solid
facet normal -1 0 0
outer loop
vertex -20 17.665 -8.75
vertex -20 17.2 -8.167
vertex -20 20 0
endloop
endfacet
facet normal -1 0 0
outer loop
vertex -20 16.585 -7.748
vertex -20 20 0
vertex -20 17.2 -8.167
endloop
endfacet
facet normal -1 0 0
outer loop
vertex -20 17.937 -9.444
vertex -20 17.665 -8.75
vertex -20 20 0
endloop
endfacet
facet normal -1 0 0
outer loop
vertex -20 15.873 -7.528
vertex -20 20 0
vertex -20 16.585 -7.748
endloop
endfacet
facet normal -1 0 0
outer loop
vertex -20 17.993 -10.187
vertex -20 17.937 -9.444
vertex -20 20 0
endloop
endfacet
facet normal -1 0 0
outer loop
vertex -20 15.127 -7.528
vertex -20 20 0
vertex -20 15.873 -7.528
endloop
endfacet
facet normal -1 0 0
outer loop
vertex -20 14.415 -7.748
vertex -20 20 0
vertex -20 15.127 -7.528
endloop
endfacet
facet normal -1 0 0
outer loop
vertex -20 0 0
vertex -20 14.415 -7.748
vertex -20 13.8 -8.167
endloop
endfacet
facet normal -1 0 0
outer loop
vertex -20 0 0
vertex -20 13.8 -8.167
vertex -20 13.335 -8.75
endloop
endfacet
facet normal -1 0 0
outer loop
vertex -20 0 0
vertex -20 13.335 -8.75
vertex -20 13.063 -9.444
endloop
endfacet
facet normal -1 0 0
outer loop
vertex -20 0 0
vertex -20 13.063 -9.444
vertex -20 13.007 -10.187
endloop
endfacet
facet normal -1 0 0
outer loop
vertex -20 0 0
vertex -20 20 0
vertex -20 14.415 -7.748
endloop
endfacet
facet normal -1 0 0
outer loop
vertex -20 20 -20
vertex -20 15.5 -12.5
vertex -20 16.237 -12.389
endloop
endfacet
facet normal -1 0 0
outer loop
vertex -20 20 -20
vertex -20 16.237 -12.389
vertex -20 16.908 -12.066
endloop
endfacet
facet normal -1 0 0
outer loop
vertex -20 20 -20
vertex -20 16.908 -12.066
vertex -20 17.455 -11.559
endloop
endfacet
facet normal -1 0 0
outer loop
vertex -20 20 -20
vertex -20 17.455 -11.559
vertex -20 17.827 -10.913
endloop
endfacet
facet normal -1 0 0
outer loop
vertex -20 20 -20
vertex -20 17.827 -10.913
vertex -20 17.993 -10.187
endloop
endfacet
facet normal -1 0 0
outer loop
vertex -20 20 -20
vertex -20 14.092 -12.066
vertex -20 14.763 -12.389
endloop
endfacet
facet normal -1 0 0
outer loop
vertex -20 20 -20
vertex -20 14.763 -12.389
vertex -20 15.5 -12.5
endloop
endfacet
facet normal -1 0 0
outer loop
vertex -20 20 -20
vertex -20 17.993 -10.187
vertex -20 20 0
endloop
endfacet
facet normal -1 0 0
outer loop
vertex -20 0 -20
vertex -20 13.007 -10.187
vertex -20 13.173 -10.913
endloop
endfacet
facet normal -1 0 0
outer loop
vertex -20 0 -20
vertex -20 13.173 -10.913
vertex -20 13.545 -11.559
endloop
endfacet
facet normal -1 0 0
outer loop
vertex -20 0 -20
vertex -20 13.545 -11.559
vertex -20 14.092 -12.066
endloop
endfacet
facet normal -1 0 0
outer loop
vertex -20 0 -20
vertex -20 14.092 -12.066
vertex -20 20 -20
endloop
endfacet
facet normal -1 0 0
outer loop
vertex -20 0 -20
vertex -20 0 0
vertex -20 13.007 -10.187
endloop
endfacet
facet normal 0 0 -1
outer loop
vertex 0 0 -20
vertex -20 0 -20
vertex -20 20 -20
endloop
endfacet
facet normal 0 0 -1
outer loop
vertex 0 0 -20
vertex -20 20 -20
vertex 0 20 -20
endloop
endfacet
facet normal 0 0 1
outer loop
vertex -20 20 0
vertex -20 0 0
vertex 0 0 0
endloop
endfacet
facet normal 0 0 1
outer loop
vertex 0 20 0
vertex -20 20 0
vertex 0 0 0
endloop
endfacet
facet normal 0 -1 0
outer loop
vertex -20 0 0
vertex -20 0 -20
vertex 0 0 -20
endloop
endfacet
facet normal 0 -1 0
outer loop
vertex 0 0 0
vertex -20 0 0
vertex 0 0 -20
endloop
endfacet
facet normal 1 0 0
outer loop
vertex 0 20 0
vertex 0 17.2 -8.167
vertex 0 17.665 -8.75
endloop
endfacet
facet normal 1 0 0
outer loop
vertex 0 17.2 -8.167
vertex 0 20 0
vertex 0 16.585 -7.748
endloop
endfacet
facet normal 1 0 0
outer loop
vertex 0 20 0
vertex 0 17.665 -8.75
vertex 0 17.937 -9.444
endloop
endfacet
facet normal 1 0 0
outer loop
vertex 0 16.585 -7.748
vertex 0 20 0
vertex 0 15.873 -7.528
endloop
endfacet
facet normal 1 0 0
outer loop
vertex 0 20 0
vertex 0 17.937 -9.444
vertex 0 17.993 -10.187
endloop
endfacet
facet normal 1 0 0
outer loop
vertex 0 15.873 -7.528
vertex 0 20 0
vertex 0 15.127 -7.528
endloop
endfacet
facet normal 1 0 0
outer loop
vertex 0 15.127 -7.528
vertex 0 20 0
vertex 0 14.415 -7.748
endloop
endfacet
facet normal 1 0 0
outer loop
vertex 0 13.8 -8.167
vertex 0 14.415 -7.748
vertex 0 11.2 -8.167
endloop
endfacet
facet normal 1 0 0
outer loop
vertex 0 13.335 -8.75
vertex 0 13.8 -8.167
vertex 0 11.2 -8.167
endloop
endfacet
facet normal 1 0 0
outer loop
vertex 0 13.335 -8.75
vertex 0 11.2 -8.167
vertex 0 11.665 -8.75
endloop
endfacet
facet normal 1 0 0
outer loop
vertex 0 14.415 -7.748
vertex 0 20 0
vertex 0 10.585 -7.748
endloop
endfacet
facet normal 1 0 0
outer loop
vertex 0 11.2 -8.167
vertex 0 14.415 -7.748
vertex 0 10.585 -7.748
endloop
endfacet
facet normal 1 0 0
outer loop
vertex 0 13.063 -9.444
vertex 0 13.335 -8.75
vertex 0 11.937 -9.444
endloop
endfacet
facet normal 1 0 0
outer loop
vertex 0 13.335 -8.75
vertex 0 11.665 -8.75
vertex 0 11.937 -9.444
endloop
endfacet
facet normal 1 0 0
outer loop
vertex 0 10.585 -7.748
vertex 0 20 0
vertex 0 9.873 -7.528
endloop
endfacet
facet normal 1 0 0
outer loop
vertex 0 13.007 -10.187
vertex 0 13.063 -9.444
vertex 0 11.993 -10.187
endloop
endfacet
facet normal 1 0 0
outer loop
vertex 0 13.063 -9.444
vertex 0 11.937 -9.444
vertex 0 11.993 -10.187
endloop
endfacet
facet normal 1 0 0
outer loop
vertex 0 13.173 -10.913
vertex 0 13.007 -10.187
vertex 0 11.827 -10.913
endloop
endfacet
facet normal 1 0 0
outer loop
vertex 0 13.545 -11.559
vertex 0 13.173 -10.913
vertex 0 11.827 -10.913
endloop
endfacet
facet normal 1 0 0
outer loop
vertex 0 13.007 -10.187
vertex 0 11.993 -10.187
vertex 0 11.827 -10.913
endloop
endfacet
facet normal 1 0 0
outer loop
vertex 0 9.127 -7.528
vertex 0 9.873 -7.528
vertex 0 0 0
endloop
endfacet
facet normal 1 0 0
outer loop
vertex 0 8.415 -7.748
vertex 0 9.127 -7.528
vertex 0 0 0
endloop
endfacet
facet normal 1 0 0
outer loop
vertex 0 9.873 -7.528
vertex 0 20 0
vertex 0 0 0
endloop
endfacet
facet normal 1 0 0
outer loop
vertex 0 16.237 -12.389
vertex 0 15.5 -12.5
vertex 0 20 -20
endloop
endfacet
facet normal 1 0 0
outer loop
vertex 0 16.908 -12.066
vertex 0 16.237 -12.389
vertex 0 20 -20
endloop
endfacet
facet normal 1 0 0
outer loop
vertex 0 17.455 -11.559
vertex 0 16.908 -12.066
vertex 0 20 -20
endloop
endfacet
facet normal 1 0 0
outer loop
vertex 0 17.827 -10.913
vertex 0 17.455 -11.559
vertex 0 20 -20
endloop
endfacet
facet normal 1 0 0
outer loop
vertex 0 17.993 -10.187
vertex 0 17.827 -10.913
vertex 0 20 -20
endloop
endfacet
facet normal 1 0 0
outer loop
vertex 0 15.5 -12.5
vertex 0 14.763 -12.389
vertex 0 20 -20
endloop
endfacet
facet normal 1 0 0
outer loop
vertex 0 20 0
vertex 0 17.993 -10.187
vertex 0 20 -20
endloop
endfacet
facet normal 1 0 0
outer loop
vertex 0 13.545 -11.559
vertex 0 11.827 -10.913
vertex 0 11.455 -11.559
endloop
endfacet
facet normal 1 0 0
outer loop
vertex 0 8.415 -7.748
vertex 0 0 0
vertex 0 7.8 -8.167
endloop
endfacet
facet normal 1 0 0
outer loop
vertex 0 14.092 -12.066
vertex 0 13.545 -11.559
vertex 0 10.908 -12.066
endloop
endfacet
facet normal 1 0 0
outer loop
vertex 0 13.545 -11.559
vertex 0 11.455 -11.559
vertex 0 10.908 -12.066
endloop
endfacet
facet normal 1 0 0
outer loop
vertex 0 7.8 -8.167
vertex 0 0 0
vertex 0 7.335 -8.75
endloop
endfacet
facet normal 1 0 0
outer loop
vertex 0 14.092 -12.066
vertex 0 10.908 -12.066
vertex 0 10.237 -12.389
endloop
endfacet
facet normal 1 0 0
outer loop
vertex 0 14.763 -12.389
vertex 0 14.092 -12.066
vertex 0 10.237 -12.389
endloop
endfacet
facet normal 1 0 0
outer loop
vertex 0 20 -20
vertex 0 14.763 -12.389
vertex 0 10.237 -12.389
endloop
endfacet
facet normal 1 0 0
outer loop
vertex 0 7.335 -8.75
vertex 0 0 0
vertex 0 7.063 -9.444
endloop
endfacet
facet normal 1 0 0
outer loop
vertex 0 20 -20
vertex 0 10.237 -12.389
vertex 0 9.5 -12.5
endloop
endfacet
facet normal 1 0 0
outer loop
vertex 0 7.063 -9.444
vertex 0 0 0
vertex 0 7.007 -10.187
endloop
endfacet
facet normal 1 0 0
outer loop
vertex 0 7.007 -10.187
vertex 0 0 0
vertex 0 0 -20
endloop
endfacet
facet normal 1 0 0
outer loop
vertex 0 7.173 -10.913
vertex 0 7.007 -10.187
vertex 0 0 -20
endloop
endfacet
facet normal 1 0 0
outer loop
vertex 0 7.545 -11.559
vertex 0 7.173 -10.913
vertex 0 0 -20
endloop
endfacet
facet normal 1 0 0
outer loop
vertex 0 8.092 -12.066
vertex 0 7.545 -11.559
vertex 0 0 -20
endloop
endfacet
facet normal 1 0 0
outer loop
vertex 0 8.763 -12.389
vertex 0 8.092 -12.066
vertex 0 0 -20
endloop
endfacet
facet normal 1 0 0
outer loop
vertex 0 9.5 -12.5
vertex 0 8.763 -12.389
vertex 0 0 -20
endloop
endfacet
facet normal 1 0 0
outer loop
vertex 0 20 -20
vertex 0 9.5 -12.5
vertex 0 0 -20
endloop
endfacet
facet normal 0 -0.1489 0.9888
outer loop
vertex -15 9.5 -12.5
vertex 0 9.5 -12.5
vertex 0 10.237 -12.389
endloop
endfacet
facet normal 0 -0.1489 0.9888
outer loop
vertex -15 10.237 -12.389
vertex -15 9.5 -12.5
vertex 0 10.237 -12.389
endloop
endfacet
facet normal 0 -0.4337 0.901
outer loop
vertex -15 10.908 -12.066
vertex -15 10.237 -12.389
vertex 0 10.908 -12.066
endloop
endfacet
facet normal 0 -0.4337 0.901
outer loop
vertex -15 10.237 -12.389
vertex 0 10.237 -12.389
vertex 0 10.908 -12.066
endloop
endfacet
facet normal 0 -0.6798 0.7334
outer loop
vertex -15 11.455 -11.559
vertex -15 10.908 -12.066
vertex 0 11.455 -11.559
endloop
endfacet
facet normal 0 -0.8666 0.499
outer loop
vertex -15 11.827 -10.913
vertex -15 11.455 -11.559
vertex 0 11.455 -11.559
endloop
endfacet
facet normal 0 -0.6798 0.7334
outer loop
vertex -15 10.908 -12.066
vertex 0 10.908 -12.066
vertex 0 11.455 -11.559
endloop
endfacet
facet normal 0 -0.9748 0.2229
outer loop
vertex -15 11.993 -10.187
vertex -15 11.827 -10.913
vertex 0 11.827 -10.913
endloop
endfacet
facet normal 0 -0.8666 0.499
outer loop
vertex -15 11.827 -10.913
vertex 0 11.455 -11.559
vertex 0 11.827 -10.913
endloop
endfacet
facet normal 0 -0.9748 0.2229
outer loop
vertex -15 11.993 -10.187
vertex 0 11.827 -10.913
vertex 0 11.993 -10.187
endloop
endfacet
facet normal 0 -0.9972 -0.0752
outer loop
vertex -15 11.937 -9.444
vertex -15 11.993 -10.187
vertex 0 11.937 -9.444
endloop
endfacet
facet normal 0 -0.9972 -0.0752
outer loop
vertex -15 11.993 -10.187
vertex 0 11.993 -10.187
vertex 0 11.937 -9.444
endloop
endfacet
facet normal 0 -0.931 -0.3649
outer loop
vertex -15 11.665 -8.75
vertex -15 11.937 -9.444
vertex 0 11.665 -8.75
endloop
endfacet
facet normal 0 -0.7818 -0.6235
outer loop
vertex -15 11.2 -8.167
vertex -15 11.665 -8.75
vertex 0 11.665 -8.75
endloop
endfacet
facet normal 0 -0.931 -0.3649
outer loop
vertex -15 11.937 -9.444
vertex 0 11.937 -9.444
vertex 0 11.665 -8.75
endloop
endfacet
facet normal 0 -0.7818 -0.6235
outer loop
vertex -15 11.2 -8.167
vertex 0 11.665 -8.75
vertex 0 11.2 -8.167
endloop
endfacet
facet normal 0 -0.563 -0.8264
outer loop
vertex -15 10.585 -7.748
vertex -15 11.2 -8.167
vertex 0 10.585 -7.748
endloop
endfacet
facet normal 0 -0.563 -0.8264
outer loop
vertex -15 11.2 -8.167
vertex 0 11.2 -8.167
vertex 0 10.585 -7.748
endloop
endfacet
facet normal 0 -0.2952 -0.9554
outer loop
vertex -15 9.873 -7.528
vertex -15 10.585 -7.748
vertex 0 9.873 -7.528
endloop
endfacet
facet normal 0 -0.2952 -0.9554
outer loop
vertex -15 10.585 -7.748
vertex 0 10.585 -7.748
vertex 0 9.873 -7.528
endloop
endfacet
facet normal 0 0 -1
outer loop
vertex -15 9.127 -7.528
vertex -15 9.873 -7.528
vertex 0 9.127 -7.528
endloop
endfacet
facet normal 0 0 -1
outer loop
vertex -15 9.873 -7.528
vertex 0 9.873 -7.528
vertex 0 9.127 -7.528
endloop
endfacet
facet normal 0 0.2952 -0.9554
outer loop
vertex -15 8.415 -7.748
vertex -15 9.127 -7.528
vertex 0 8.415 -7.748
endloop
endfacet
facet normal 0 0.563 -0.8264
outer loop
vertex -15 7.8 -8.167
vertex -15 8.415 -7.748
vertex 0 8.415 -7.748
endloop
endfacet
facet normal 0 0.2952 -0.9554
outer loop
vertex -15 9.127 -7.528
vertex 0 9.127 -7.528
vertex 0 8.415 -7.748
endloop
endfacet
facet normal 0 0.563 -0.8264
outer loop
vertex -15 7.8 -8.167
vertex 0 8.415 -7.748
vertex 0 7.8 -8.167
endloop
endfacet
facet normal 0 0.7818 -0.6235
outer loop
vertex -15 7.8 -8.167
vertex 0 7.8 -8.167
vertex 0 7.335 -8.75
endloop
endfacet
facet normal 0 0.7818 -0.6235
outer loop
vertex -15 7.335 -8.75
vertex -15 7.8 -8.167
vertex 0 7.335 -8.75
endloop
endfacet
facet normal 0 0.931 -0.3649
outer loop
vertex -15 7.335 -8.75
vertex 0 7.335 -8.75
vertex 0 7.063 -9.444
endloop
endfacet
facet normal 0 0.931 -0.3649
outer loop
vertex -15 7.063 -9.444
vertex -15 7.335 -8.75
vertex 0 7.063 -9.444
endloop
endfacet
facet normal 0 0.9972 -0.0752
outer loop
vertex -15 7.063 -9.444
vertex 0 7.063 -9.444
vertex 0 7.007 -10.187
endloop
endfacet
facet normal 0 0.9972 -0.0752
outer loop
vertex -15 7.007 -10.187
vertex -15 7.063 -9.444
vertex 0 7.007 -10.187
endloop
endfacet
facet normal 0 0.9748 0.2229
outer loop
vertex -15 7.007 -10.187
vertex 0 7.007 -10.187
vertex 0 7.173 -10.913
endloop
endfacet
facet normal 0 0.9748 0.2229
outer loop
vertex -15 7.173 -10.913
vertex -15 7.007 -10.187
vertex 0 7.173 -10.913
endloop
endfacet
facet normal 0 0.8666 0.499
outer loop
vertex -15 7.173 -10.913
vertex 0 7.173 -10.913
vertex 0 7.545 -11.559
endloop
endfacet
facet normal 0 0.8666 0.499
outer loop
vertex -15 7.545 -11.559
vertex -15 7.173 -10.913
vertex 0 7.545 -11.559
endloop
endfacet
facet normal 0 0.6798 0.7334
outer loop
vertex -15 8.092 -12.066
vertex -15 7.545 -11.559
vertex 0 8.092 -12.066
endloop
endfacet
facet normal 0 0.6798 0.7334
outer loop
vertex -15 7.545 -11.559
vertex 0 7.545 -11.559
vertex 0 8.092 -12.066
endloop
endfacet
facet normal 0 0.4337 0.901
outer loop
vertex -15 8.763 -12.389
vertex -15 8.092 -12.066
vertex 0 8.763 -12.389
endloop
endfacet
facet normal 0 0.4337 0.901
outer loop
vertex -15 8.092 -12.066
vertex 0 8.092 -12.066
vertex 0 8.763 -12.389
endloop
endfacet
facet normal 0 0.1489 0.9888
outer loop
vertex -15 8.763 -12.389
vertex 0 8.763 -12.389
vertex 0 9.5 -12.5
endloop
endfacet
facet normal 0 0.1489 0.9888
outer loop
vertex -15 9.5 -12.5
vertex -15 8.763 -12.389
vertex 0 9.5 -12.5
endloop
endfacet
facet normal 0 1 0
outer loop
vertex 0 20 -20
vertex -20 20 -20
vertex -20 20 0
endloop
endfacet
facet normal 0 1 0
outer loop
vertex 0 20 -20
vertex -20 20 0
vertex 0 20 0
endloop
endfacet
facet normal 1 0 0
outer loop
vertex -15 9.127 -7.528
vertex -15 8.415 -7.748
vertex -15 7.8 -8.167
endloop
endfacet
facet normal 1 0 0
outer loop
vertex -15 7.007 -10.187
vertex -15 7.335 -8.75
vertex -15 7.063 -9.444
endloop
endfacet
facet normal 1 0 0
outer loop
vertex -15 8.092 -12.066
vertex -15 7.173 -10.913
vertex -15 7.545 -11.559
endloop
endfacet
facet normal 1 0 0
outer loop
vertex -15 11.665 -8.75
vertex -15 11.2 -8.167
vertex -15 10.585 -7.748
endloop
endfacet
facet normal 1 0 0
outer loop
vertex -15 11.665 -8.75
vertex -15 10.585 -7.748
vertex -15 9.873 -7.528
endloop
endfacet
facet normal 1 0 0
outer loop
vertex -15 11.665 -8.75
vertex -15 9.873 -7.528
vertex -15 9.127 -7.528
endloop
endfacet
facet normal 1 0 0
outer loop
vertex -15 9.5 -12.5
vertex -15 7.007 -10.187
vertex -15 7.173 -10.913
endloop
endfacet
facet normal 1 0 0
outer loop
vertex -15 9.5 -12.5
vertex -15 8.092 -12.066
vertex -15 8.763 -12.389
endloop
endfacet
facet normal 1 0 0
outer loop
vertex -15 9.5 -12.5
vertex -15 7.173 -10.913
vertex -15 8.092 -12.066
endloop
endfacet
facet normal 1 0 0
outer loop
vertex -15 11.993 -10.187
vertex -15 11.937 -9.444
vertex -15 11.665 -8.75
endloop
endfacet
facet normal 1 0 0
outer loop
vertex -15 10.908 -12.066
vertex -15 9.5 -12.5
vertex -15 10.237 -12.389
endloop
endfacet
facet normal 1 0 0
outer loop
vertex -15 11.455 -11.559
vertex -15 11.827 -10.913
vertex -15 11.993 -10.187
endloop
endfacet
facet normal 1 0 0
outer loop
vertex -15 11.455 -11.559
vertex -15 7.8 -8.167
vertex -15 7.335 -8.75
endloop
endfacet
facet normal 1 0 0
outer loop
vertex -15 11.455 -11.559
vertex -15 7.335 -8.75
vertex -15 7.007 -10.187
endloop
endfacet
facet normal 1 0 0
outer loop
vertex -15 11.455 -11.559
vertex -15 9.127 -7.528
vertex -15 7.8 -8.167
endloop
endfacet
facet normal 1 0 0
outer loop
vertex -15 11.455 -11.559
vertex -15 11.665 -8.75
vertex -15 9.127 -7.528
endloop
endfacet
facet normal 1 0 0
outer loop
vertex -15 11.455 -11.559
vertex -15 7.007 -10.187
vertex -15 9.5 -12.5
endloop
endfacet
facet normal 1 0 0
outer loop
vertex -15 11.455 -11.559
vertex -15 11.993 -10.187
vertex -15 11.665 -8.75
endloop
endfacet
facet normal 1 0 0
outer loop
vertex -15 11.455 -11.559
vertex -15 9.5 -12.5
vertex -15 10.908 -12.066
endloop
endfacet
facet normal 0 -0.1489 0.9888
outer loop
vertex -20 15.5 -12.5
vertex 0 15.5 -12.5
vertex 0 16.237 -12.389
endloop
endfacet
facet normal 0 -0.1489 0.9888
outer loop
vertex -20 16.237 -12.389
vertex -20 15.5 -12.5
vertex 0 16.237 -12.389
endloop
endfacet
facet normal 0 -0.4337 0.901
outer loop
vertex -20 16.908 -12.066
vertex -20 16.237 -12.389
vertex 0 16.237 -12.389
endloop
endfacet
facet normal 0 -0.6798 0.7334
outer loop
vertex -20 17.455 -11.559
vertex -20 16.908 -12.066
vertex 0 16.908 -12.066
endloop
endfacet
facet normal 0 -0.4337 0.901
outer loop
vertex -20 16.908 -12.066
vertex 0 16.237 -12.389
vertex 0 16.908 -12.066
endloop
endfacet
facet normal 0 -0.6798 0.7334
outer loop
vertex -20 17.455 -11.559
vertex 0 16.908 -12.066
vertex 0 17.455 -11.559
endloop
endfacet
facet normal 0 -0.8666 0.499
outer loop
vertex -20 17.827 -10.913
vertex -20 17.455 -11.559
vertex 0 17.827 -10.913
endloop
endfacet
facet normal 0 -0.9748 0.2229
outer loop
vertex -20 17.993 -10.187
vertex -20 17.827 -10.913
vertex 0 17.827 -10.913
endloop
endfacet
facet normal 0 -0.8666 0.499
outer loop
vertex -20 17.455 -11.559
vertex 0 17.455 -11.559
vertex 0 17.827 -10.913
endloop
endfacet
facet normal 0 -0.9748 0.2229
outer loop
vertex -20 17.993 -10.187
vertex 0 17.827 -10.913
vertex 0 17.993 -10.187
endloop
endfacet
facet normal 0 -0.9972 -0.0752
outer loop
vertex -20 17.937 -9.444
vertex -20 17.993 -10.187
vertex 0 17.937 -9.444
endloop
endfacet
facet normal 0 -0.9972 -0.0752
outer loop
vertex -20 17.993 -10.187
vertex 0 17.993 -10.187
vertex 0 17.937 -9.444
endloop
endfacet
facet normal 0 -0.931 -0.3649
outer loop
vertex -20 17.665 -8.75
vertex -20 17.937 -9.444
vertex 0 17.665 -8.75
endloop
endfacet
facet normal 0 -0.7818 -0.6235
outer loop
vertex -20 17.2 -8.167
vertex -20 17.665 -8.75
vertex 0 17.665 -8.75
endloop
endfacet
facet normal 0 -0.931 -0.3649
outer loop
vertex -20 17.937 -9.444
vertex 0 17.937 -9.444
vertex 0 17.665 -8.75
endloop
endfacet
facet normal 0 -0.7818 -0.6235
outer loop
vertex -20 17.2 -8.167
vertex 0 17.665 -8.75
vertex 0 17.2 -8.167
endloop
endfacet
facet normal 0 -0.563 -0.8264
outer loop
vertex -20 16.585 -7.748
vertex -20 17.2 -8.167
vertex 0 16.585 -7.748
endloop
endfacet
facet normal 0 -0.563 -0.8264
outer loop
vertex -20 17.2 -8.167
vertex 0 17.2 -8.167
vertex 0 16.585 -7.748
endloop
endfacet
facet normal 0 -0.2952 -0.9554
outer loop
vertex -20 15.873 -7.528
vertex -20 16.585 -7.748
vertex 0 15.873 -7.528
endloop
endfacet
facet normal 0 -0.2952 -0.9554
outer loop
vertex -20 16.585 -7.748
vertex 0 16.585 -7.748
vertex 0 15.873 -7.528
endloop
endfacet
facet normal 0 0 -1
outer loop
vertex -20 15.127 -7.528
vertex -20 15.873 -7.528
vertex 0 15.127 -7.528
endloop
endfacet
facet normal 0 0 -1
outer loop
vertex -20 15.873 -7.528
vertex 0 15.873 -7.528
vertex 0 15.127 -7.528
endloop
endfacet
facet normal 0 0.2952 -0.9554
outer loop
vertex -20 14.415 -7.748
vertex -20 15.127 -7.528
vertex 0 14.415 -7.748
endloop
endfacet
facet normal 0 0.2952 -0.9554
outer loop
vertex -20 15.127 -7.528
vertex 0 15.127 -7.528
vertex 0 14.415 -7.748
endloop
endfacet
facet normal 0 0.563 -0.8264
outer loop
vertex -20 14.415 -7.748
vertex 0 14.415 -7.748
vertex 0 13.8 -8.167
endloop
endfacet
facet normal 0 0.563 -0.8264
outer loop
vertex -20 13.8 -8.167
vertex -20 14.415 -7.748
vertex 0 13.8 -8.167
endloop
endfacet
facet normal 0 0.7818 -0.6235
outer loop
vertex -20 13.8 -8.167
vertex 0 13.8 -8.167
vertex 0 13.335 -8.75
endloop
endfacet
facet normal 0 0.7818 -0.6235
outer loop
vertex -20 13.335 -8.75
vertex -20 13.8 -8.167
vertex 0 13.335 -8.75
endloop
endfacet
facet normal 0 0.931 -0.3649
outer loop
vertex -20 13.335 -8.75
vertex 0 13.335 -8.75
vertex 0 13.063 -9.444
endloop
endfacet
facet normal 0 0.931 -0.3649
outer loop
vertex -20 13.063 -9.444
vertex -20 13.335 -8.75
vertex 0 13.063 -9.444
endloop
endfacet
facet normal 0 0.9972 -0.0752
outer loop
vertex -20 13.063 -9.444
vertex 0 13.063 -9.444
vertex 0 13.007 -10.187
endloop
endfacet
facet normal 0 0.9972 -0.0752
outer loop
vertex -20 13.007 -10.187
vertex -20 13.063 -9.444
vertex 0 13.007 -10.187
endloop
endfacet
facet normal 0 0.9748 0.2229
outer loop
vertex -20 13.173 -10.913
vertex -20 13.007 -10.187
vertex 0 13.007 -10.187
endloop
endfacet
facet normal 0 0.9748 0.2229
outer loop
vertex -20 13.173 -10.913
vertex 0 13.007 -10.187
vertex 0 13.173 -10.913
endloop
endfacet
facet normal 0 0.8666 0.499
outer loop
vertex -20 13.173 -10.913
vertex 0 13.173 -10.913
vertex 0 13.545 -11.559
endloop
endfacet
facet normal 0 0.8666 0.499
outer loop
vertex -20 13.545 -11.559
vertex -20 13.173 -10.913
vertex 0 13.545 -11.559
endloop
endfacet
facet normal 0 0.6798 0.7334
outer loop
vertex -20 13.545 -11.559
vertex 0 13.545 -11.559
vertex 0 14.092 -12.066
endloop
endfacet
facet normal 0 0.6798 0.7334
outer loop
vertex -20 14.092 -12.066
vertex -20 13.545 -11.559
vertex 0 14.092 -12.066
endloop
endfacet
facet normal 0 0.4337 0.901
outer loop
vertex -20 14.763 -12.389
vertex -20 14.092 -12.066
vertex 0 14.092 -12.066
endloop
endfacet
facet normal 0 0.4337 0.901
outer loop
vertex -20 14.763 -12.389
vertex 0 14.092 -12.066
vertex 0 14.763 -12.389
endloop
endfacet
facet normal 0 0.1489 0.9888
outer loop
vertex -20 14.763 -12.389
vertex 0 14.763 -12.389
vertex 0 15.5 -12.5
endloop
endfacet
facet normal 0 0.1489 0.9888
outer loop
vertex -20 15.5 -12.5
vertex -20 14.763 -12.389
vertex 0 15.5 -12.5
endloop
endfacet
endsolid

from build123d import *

# Parameters (mm, degrees)
SKETCH1_W           = 20
SKETCH1_H           = 20
BOSS_EXTRUDE1_DEPTH = 20
SKETCH3_R           = 2.5
CUT_EXTRUDE1_DEPTH  = 35.641016151
SKETCH4_R           = 2.5
CUT_EXTRUDE2_DEPTH  = 15


with BuildPart() as part:
    # Sketch1 → Boss-Extrude1 (new body)
    with BuildSketch(Plane(origin=(0, 0, 0), x_dir=(1, 0, 0), z_dir=(0, 1, 0))):
        with Locations((-10, 10)):
            Rectangle(SKETCH1_W, SKETCH1_H)
    extrude(amount=BOSS_EXTRUDE1_DEPTH)

    # Sketch3 → Cut-Extrude1 (cut, through all)
    with BuildSketch(Plane(origin=(0, 0, 0), x_dir=(0, 0, -1), z_dir=(1, 0, 0))):
        with Locations((10, 15.5)):
            Circle(SKETCH3_R)
    extrude(amount=-CUT_EXTRUDE1_DEPTH, mode=Mode.SUBTRACT)

    # Sketch4 → Cut-Extrude2 (cut)
    with BuildSketch(Plane(origin=(0, 0, 0), x_dir=(0, 0, -1), z_dir=(1, 0, 0))):
        with Locations((10, 9.5)):
            Circle(SKETCH4_R)
    extrude(amount=-CUT_EXTRUDE2_DEPTH, mode=Mode.SUBTRACT)


solid = part.part
